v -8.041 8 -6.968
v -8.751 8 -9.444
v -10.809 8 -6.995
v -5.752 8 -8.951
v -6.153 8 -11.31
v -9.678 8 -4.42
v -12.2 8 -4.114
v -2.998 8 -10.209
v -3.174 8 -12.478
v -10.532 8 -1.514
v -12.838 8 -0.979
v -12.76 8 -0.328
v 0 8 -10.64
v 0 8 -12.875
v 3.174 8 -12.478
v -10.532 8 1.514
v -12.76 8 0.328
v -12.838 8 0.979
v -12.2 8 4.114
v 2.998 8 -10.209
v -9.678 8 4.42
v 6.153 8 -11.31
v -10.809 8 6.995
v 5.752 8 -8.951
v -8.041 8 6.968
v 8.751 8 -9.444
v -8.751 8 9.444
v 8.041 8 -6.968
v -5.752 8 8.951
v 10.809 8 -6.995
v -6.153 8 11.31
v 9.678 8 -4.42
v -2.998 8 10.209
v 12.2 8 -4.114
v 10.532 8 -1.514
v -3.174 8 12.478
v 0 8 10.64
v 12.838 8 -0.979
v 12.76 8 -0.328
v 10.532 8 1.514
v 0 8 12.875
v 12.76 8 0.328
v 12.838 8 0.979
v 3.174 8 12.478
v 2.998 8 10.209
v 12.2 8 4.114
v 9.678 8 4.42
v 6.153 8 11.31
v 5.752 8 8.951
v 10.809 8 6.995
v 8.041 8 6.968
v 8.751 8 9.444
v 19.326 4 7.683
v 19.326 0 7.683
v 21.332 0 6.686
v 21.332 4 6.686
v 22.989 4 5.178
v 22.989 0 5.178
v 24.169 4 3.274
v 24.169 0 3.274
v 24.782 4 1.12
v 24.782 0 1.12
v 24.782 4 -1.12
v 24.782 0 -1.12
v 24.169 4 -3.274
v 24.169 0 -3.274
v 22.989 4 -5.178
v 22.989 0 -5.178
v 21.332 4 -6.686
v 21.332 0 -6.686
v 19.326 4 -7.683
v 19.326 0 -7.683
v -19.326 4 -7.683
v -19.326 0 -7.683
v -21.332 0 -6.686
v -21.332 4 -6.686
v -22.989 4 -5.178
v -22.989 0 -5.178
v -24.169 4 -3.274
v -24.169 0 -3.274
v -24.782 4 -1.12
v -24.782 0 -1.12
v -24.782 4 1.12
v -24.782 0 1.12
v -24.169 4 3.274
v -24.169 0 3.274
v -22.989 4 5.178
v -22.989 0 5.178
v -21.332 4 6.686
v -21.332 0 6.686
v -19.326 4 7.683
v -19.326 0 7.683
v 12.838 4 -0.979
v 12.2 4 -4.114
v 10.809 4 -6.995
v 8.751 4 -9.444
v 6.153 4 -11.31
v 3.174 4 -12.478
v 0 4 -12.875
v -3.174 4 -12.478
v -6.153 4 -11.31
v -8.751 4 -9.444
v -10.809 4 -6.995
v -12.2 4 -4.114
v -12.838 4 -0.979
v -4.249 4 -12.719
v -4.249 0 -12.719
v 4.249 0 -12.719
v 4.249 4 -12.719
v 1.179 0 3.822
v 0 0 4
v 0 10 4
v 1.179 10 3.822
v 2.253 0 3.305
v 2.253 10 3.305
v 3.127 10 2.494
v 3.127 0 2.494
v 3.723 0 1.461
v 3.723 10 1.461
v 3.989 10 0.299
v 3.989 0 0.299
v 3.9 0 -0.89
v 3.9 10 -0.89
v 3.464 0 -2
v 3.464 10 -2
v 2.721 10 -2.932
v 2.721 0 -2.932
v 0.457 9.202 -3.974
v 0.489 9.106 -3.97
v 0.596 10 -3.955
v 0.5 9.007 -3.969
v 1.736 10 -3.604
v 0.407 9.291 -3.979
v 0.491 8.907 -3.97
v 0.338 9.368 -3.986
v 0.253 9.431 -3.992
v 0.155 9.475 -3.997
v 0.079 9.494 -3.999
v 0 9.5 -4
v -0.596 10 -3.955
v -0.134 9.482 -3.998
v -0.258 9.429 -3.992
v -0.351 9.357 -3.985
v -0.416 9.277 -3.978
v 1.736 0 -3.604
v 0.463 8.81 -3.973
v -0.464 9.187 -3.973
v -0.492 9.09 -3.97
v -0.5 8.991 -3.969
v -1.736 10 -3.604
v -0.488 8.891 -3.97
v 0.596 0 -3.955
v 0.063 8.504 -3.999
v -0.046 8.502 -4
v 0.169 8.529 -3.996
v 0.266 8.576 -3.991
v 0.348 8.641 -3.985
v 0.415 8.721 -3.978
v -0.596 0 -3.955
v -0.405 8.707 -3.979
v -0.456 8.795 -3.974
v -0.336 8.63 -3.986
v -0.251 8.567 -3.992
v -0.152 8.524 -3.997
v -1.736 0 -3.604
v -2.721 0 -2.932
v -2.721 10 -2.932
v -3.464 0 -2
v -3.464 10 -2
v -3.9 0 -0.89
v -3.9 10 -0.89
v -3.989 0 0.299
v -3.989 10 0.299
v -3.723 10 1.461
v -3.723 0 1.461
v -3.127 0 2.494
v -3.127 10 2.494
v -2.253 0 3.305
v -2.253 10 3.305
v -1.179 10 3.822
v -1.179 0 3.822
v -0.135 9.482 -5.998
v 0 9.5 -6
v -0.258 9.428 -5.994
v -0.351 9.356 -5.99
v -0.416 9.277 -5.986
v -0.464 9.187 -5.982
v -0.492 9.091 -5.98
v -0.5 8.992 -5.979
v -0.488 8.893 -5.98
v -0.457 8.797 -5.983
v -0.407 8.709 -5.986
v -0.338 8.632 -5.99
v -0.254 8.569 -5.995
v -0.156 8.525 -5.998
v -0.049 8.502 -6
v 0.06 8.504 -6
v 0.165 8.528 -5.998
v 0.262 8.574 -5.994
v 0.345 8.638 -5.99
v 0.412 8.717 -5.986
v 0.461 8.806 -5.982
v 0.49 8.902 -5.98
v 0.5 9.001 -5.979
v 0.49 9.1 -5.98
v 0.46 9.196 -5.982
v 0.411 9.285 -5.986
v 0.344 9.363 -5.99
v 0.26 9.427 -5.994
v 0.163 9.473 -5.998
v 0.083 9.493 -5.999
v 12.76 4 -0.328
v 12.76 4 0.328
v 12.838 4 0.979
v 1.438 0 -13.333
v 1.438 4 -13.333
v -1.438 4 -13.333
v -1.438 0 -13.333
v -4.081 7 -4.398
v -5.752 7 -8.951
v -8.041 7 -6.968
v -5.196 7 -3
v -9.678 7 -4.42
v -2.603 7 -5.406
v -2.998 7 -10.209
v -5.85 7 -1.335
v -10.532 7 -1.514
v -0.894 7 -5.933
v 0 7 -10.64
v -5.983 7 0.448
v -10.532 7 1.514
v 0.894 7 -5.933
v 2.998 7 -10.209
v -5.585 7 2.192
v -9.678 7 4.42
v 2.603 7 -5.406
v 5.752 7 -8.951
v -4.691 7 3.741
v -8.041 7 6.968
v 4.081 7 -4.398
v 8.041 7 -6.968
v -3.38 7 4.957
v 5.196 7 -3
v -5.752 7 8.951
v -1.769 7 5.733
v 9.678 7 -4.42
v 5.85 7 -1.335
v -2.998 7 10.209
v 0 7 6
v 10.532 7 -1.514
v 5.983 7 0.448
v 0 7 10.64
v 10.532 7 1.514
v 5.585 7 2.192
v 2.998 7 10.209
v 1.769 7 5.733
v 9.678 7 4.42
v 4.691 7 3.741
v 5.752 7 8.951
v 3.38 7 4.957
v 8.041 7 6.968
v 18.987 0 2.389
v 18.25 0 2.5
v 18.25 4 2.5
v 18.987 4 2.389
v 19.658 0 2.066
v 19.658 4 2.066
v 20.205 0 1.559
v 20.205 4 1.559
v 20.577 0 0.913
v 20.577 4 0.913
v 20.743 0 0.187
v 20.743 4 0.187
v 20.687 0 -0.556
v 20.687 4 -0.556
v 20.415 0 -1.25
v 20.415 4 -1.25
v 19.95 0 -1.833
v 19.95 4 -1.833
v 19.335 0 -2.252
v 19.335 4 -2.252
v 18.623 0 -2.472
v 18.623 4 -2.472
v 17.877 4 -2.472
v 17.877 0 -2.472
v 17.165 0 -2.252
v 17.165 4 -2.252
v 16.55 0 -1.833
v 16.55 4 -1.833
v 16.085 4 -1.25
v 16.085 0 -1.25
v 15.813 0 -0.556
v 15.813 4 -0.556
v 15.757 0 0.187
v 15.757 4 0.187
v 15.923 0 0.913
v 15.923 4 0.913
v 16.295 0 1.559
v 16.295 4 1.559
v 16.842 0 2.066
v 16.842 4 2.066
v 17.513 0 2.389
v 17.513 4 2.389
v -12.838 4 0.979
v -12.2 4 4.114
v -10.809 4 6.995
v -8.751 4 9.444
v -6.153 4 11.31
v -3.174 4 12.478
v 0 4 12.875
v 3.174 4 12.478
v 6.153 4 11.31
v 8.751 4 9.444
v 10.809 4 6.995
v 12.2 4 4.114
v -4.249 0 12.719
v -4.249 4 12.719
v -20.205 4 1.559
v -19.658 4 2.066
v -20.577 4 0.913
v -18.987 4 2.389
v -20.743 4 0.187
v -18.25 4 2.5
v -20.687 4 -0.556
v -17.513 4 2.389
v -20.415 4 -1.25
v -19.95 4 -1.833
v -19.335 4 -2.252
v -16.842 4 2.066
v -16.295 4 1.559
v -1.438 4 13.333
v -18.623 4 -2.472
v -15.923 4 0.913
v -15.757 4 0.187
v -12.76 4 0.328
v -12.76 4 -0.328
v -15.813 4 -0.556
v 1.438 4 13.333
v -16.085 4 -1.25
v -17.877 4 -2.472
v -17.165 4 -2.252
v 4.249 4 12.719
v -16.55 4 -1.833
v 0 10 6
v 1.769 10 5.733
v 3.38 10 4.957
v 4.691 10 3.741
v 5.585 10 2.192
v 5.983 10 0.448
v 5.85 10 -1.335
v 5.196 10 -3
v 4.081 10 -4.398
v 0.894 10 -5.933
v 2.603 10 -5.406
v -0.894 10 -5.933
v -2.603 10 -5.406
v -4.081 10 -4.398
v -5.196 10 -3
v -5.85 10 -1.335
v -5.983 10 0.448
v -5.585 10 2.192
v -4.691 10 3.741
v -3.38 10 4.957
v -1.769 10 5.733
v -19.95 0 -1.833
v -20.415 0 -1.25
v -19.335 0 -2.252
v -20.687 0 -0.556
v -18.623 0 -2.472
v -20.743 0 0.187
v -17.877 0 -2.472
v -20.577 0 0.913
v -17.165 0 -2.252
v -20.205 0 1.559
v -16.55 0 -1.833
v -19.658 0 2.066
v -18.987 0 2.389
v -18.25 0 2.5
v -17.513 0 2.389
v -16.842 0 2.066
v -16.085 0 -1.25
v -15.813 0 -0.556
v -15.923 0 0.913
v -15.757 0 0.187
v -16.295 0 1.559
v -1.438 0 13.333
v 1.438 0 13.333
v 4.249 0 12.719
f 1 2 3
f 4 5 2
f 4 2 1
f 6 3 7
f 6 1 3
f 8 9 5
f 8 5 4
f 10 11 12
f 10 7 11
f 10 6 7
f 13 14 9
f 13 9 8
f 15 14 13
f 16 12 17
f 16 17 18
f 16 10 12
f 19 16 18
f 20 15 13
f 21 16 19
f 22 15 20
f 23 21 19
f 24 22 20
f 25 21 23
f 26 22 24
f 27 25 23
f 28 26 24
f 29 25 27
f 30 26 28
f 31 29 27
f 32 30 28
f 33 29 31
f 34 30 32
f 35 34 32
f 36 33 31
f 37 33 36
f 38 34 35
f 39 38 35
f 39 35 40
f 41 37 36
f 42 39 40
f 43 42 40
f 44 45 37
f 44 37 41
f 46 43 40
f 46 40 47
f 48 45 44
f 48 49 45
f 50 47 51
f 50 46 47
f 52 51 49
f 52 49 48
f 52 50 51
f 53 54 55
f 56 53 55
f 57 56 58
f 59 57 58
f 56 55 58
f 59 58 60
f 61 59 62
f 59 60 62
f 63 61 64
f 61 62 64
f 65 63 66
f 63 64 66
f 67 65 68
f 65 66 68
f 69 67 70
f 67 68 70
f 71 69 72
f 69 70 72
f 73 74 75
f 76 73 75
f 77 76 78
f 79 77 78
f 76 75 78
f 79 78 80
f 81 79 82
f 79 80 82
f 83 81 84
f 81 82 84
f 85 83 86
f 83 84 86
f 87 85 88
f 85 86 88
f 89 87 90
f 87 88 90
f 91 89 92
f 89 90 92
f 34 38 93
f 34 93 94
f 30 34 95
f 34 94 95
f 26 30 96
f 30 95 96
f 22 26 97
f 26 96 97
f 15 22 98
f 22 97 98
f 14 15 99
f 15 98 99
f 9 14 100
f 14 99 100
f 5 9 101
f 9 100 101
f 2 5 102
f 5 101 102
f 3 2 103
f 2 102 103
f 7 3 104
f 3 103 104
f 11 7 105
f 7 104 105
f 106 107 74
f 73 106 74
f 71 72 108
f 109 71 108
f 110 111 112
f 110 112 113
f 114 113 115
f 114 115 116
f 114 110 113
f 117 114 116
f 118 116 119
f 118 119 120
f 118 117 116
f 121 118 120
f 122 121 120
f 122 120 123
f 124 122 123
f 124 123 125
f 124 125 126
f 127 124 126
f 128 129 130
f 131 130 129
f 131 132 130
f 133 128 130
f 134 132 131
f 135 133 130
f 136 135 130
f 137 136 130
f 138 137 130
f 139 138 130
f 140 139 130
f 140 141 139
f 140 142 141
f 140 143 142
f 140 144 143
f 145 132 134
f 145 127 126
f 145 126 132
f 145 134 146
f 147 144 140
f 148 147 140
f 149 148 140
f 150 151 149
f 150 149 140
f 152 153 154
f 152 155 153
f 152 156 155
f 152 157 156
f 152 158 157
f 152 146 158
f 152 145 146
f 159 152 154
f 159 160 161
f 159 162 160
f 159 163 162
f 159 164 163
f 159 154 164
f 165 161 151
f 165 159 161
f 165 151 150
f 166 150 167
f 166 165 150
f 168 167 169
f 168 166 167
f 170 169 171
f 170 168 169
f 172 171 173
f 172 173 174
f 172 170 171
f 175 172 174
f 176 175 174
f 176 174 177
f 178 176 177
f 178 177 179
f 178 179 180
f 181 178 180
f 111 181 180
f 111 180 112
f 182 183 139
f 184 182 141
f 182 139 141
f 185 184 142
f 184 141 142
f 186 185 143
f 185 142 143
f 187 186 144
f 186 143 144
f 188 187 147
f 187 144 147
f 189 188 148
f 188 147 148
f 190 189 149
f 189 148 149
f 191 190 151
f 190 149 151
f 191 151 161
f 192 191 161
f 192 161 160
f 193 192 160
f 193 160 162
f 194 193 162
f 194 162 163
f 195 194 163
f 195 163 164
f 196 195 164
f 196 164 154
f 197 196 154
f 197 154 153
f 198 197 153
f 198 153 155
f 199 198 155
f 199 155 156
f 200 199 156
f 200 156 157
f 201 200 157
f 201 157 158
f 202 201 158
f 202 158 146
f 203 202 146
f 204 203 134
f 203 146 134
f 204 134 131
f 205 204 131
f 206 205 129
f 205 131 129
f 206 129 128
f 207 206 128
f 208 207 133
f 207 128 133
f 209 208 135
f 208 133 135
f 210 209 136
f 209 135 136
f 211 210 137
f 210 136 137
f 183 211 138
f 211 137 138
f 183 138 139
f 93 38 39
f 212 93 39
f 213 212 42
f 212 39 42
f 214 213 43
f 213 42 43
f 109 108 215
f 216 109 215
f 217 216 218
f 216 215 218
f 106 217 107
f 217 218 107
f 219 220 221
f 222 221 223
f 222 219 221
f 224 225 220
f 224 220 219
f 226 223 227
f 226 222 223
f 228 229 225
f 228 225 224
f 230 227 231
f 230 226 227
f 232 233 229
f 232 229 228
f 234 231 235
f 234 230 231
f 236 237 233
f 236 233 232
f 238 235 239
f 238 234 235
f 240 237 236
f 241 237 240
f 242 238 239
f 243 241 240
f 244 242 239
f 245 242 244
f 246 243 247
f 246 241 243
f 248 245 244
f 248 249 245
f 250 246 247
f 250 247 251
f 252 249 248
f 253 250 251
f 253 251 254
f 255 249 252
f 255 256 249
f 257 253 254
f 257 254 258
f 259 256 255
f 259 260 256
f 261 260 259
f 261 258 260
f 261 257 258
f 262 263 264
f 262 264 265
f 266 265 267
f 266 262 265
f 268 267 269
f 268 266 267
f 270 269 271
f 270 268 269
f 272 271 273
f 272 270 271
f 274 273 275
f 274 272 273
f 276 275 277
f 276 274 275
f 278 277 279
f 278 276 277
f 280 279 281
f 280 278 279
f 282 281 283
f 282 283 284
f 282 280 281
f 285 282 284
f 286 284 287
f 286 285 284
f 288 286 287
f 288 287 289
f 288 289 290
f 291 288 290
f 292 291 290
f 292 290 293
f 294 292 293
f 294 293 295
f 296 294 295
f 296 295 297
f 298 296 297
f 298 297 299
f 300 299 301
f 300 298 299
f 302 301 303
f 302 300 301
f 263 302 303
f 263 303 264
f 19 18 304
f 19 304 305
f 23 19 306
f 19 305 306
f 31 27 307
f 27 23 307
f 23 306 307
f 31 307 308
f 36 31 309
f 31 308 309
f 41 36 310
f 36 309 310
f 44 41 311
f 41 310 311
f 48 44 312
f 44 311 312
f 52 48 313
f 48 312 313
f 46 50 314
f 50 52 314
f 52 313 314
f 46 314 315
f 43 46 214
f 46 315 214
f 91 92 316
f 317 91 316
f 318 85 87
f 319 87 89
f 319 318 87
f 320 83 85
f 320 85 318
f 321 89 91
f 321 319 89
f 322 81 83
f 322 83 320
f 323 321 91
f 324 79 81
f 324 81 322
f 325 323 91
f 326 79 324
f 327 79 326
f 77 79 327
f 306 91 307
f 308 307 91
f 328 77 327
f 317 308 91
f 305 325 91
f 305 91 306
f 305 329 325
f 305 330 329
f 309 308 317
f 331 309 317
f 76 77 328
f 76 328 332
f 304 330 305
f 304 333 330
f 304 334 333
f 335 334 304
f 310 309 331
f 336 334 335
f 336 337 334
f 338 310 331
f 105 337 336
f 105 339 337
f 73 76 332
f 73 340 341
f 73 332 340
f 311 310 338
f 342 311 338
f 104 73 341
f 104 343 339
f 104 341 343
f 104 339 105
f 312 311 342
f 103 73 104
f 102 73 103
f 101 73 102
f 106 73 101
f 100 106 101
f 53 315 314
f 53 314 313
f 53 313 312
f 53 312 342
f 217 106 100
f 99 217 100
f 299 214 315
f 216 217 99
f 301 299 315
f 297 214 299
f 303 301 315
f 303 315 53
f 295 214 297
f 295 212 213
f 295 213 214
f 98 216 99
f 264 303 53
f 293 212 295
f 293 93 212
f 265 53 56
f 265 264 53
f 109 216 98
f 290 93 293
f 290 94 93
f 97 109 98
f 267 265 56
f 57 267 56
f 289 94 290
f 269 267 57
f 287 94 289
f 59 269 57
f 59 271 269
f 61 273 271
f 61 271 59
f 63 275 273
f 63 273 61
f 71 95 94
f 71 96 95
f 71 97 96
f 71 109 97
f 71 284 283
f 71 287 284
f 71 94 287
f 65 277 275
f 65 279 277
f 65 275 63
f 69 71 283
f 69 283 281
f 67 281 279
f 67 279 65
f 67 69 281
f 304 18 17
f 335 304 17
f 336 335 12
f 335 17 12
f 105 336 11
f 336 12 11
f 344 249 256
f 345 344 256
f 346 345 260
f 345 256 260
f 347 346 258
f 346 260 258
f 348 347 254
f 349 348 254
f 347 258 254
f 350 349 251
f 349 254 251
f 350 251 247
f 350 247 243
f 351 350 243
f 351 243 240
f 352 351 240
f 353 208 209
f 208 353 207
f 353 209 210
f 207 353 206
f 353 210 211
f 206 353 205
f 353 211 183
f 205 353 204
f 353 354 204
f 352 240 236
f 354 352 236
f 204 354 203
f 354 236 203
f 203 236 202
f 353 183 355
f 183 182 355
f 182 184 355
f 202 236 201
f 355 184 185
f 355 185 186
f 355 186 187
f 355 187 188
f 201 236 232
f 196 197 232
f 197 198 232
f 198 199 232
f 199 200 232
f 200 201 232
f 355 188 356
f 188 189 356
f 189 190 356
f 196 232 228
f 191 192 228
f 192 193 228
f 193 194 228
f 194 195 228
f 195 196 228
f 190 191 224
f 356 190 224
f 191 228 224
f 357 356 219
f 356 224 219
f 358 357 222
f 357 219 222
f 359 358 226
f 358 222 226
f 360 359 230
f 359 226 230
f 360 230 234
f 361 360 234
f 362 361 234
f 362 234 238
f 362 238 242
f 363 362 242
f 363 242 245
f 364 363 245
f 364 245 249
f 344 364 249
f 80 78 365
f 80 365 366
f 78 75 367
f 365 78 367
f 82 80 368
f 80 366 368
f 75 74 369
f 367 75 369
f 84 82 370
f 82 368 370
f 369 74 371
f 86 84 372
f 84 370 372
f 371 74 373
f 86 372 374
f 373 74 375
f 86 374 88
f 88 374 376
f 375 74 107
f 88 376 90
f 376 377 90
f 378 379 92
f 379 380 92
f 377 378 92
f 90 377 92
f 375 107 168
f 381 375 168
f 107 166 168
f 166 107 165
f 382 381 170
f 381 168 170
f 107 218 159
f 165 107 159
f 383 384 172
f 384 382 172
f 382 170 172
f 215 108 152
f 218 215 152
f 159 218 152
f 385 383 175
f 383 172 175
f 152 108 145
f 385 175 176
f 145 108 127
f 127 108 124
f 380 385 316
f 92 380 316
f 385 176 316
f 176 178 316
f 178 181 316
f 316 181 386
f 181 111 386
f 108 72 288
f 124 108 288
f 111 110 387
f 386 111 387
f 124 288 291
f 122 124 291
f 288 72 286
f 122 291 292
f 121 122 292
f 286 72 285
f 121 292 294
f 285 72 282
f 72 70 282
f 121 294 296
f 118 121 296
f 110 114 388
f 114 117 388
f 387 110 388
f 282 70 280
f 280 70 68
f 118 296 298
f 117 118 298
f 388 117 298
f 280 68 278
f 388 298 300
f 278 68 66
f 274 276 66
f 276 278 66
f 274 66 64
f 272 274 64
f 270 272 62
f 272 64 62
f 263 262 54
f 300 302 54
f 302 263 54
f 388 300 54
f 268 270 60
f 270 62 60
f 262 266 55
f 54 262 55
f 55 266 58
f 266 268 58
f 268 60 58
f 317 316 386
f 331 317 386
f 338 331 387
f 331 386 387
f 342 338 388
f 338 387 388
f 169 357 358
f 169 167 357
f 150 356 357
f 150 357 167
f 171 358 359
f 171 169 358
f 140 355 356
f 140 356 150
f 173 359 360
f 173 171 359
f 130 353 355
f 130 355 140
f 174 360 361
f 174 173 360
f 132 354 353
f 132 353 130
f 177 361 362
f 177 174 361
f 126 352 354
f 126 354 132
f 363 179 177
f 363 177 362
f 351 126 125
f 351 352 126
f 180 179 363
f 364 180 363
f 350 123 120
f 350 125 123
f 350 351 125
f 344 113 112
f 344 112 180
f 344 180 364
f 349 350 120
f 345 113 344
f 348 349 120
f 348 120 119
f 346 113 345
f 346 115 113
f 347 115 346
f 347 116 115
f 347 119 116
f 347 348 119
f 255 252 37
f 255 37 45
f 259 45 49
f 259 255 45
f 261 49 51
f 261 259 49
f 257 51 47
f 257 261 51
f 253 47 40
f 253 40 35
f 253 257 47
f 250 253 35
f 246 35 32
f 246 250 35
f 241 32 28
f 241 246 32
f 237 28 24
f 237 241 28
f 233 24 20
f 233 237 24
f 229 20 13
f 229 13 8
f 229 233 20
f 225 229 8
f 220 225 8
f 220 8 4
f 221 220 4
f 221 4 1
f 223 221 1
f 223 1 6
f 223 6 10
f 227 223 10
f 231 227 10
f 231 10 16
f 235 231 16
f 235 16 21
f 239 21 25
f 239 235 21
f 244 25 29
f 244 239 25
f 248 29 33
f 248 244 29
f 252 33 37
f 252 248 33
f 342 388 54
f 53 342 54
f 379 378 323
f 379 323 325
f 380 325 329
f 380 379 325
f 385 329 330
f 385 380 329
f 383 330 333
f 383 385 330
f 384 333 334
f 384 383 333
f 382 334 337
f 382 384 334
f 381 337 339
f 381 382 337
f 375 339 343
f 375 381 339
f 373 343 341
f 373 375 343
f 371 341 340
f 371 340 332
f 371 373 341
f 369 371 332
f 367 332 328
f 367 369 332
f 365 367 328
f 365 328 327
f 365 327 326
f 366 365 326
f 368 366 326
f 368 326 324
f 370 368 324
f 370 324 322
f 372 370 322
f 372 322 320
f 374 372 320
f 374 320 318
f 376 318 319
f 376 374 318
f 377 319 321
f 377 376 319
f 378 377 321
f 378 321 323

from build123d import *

# Parameters (mm, degrees)
SKETCH1_R           = 10.64
BOSS_EXTRUDE1_DEPTH = 4
SKETCH2_R           = 12.875
SKETCH2_R_2         = 10.64
BOSS_EXTRUDE2_DEPTH = 4
SKETCH3_R           = 6
SKETCH3_R_2         = 4
BOSS_EXTRUDE3_DEPTH = 10
SKETCH5_R           = 2.5
CUT_EXTRUDE1_DEPTH  = 4
SKETCH6_R           = 10.64
SKETCH6_R_2         = 6
BOSS_EXTRUDE4_DEPTH = 7
SKETCH7_R           = 5.5
CUT_EXTRUDE2_DEPTH  = 4
SKETCH8_R           = 0.5
CUT_EXTRUDE3_DEPTH  = 30.964106861


with BuildPart() as part:
    # Sketch1 → Boss-Extrude1 (new body)
    with BuildSketch(Plane(origin=(0, 0, 0), x_dir=(1, 0, 0), z_dir=(0, 1, 0))):
        with BuildLine():
            Line((-4.248633652, 12.719167115), (-19.326288783, 7.682718392))
            ThreePointArc((-19.326288783, 7.682718392), (-24.86, 0), (-19.326288783, -7.682718392))
            Line((-19.326288783, -7.682718392), (-4.248633652, -12.719167115))
            ThreePointArc((-4.248633652, -12.719167115), (0, -13.41), (4.248633652, -12.719167115))
            Line((4.248633652, -12.719167115), (19.326288783, -7.682718392))
            ThreePointArc((19.326288783, -7.682718392), (24.86, 0), (19.326288783, 7.682718392))
            Line((19.326288783, 7.682718392), (4.248633652, 12.719167115))
            ThreePointArc((4.248633652, 12.719167115), (0, 13.41), (-4.248633652, 12.719167115))
        make_face()
        with Locations(Location((0, 0, 0), (0, 0, 270))):
            Circle(SKETCH1_R, mode=Mode.SUBTRACT)
    extrude(amount=BOSS_EXTRUDE1_DEPTH)

    # Sketch2 → Boss-Extrude2 (add)
    with BuildSketch(Plane(origin=(0, 4, 0), x_dir=(1, 0, 0), z_dir=(0, 1, 0))):
        with Locations(Location((0, 0, 0), (0, 0, 270))):
            Circle(SKETCH2_R)
        with Locations(Location((0, 0, 0), (0, 0, 270))):
            Circle(SKETCH2_R_2, mode=Mode.SUBTRACT)
    extrude(amount=BOSS_EXTRUDE2_DEPTH)

    # Sketch5 → Cut-Extrude1 (cut)
    with BuildSketch(Plane(origin=(0, 0, 0), x_dir=(1, 0, 0), z_dir=(0, 1, 0))):
        with Locations(Location((-18.25, 0, 0), (0, 0, 270))):
            Circle(SKETCH5_R)
        with Locations(Location((18.25, 0, 0), (0, 0, 270))):
            Circle(SKETCH5_R)
    extrude(amount=CUT_EXTRUDE1_DEPTH, mode=Mode.SUBTRACT)



with BuildPart() as body_2:
    # Sketch3 → Boss-Extrude3 (new body)
    with BuildSketch(Plane(origin=(0, 0, 0), x_dir=(1, 0, 0), z_dir=(0, 1, 0))):
        with Locations(Location((0, 0, 0), (0, 0, 270))):
            Circle(SKETCH3_R)
        with Locations(Location((0, 0, 0), (0, 0, 270))):
            Circle(SKETCH3_R_2, mode=Mode.SUBTRACT)
    extrude(amount=BOSS_EXTRUDE3_DEPTH)


with BuildPart() as part_1:
    add(part.part)

    add(body_2.part)  # Boss-Extrude4 merges body 2
    # Sketch6 → Boss-Extrude4 (add)
    with BuildSketch(Plane(origin=(0, 0, 0), x_dir=(1, 0, 0), z_dir=(0, 1, 0))):
        with Locations(Location((0, 0, 0), (0, 0, 270))):
            Circle(SKETCH6_R)
        with Locations(Location((0, 0, 0), (0, 0, 270))):
            Circle(SKETCH6_R_2, mode=Mode.SUBTRACT)
    extrude(amount=BOSS_EXTRUDE4_DEPTH)

    # Sketch7 → Cut-Extrude2 (cut)
    with BuildSketch(Plane(origin=(0, 8, 0), x_dir=(1, 0, 0), z_dir=(0, 1, 0))):
        with Locations((-18.25, 0)):
            Circle(SKETCH7_R)
        with Locations((18.25, 0)):
            Circle(SKETCH7_R)
    extrude(amount=-CUT_EXTRUDE2_DEPTH, mode=Mode.SUBTRACT)

    # Sketch8 → Cut-Extrude3 (cut, through all)
    with BuildSketch(Plane.XY):
        with Locations(Location((0, 9, 0), (0, 0, 90))):
            Circle(SKETCH8_R)
    extrude(amount=-CUT_EXTRUDE3_DEPTH, mode=Mode.SUBTRACT)


solid = part_1.part
